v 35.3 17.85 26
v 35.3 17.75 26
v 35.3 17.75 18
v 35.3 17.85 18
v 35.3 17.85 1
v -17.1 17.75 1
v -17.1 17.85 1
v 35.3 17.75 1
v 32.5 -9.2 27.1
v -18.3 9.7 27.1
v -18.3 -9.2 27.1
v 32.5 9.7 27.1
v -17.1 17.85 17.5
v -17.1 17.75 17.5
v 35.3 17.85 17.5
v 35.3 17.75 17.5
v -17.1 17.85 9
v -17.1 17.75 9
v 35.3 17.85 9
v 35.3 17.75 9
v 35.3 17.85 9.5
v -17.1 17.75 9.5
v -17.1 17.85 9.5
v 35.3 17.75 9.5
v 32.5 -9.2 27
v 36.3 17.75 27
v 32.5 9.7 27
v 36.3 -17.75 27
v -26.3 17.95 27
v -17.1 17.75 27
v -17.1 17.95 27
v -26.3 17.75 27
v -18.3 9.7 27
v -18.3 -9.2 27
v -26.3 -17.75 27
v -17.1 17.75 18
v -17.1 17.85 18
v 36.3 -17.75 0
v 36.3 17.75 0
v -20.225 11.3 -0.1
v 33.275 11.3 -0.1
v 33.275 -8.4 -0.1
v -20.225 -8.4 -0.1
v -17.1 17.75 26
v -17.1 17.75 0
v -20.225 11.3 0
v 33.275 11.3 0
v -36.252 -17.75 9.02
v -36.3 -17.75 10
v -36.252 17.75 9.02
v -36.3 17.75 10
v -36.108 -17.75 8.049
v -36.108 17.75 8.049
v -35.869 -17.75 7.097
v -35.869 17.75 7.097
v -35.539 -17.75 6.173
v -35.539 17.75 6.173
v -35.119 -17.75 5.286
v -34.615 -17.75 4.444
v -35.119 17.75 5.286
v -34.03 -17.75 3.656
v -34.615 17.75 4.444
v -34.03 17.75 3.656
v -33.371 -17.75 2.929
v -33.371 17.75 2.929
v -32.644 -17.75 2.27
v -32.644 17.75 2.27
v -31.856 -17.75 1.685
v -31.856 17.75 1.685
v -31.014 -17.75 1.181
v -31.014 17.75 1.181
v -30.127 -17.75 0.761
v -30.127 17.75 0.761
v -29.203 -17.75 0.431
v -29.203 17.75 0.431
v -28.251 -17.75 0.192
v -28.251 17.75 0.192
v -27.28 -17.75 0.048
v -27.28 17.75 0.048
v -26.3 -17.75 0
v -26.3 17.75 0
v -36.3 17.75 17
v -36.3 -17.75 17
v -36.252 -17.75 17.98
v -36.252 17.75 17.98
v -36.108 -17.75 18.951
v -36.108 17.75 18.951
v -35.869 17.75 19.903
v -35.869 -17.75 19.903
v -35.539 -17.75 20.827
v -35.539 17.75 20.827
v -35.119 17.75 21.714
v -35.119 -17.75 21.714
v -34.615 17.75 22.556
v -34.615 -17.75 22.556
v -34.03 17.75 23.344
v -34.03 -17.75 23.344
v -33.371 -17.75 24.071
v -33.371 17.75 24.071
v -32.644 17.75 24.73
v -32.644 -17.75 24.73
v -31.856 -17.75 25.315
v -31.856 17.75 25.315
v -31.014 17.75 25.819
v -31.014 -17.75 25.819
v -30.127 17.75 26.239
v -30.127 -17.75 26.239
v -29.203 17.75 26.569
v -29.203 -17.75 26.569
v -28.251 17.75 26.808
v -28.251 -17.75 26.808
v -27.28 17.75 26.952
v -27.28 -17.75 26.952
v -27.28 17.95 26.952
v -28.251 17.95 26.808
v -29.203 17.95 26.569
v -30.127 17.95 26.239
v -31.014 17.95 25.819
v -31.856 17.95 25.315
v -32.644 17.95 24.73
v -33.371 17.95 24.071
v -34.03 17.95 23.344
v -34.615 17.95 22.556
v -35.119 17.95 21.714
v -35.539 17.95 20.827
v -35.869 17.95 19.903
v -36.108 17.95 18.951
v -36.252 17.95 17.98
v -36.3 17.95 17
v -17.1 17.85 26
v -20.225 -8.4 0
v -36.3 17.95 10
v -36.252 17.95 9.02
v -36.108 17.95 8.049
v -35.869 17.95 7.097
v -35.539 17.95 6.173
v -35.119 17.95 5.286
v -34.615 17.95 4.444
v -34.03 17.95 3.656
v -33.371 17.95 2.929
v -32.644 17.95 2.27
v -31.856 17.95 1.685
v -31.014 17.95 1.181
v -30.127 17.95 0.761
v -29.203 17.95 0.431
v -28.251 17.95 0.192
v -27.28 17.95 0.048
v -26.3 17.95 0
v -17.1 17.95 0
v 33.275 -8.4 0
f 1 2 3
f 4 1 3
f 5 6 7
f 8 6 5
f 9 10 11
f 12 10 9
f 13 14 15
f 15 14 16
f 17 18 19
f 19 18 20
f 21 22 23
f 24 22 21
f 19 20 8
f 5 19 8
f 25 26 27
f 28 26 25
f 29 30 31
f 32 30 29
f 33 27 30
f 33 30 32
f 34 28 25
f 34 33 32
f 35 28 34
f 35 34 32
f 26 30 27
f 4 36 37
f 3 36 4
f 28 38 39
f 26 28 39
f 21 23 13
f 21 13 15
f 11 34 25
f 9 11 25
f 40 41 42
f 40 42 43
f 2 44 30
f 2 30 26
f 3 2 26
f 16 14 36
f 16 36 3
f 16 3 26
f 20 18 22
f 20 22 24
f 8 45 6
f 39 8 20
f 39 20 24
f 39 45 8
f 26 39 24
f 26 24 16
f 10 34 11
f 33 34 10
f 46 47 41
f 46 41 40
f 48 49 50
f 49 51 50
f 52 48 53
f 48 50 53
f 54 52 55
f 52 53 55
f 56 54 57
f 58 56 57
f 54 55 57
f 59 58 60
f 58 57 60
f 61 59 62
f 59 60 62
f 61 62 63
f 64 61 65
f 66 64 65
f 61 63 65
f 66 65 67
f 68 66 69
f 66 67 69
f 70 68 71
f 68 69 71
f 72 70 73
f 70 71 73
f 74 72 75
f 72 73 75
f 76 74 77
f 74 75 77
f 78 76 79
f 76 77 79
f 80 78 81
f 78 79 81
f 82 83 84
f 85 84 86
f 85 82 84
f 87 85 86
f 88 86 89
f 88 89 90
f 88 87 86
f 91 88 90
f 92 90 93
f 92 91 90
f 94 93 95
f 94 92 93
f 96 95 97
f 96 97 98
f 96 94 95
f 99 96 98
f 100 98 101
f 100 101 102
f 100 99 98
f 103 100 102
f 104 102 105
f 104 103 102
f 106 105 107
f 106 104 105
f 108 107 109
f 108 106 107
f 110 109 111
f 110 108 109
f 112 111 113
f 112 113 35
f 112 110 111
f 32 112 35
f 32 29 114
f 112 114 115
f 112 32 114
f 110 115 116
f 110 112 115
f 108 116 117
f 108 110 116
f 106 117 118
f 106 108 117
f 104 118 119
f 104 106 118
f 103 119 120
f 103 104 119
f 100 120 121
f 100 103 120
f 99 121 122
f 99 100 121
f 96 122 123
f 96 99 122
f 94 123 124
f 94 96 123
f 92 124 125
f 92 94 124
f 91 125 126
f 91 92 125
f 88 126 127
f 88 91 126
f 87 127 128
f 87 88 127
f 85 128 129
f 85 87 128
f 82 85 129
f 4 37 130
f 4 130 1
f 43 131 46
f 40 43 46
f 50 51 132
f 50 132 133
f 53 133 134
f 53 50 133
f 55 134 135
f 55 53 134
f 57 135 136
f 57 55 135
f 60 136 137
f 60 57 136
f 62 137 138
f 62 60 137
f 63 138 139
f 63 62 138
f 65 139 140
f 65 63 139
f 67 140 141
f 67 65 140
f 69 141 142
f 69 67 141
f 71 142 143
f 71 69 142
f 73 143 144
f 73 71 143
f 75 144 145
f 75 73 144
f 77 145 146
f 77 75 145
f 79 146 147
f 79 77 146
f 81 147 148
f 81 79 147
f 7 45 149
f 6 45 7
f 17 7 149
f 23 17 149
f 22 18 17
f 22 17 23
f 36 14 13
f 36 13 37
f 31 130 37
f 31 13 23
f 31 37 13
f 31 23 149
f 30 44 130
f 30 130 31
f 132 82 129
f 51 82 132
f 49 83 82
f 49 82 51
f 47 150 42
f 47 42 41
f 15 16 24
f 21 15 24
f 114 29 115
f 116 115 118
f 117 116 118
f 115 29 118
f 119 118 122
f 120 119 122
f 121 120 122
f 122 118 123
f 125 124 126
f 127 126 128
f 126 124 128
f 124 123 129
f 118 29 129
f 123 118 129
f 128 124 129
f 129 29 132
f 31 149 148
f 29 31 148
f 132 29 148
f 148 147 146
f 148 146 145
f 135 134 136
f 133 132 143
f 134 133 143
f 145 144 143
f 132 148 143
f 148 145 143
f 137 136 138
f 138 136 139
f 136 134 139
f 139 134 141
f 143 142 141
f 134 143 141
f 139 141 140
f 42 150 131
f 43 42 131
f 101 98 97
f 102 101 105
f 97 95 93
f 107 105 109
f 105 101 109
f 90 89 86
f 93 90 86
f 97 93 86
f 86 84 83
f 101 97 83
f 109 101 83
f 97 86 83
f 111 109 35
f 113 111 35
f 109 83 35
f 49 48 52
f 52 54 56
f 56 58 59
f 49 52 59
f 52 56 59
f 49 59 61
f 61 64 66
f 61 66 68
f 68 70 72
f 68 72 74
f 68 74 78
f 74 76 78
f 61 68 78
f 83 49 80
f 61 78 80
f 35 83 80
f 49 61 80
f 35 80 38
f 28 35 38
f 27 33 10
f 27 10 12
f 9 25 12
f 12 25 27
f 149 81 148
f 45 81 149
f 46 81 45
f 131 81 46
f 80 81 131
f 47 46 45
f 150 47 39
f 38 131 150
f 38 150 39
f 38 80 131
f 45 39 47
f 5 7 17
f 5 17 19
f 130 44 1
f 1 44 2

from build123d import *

# Parameters (mm, degrees)
SKETCH1_W           = 72.6
SKETCH1_H           = 35.5
BOSS_EXTRUDE1_DEPTH = 27
FILLET1_R           = 10
SKETCH2_W           = 52.4
SKETCH2_H           = 8
BOSS_EXTRUDE2_DEPTH = 0.1
SKETCH3_W           = 50.8
SKETCH3_H           = 18.9
BOSS_EXTRUDE3_DEPTH = 0.1
BOSS_EXTRUDE4_DEPTH = 0.2
SKETCH5_W           = 53.5
SKETCH5_H           = 19.7
BOSS_EXTRUDE5_DEPTH = 0.1


with BuildPart() as part:
    # Sketch1 → Boss-Extrude1 (new body)
    with BuildSketch(Plane.XY):
        Rectangle(SKETCH1_W, SKETCH1_H)
    extrude(amount=BOSS_EXTRUDE1_DEPTH)

    # Fillet1
    fillet1_edges = [part.edges().sort_by_distance(p)[0] for p in [
        (-36.3, 0, 27),
        (-36.3, 0, 0),
    ]]
    fillet(fillet1_edges, radius=FILLET1_R)

    # Sketch2 → Boss-Extrude2 (add)
    with BuildSketch(Plane(origin=(0, 17.75, 0), x_dir=(1, 0, 0), z_dir=(0, 1, 0))):
        with Locations((9.1, -5)):
            Rectangle(SKETCH2_W, SKETCH2_H)
        with Locations((9.1, -13.5)):
            Rectangle(SKETCH2_W, SKETCH2_H)
        with Locations((9.1, -22)):
            Rectangle(SKETCH2_W, SKETCH2_H)
    extrude(amount=BOSS_EXTRUDE2_DEPTH)

    # Sketch3 → Boss-Extrude3 (add)
    with BuildSketch(Plane.XY.offset(27)):
        with Locations((7.1, 0.25)):
            Rectangle(SKETCH3_W, SKETCH3_H)
    extrude(amount=BOSS_EXTRUDE3_DEPTH)

    # Sketch4 → Boss-Extrude4 (add)
    with BuildSketch(Plane(origin=(0, 17.75, 0), x_dir=(1, 0, 0), z_dir=(0, 1, 0))):
        with BuildLine():
            Line((-26.3, 0), (-17.1, 0))
            Line((-17.1, 0), (-17.1, -27))
            Line((-17.1, -27), (-26.3, -27))
            ThreePointArc((-26.3, -27), (-33.371067812, -24.071067812), (-36.3, -17))
            Line((-36.3, -17), (-36.3, -10))
            ThreePointArc((-36.3, -10), (-33.371067812, -2.928932188), (-26.3, 0))
        make_face()
    extrude(amount=BOSS_EXTRUDE4_DEPTH)

    # Sketch5 → Boss-Extrude5 (add)
    with BuildSketch(Plane(origin=(0, 0, 0), x_dir=(-1, 0, 0), z_dir=(0, 0, -1))):
        with Locations((-6.524728086, 1.45)):
            Rectangle(SKETCH5_W, SKETCH5_H)
    extrude(amount=BOSS_EXTRUDE5_DEPTH)


solid = part.part
